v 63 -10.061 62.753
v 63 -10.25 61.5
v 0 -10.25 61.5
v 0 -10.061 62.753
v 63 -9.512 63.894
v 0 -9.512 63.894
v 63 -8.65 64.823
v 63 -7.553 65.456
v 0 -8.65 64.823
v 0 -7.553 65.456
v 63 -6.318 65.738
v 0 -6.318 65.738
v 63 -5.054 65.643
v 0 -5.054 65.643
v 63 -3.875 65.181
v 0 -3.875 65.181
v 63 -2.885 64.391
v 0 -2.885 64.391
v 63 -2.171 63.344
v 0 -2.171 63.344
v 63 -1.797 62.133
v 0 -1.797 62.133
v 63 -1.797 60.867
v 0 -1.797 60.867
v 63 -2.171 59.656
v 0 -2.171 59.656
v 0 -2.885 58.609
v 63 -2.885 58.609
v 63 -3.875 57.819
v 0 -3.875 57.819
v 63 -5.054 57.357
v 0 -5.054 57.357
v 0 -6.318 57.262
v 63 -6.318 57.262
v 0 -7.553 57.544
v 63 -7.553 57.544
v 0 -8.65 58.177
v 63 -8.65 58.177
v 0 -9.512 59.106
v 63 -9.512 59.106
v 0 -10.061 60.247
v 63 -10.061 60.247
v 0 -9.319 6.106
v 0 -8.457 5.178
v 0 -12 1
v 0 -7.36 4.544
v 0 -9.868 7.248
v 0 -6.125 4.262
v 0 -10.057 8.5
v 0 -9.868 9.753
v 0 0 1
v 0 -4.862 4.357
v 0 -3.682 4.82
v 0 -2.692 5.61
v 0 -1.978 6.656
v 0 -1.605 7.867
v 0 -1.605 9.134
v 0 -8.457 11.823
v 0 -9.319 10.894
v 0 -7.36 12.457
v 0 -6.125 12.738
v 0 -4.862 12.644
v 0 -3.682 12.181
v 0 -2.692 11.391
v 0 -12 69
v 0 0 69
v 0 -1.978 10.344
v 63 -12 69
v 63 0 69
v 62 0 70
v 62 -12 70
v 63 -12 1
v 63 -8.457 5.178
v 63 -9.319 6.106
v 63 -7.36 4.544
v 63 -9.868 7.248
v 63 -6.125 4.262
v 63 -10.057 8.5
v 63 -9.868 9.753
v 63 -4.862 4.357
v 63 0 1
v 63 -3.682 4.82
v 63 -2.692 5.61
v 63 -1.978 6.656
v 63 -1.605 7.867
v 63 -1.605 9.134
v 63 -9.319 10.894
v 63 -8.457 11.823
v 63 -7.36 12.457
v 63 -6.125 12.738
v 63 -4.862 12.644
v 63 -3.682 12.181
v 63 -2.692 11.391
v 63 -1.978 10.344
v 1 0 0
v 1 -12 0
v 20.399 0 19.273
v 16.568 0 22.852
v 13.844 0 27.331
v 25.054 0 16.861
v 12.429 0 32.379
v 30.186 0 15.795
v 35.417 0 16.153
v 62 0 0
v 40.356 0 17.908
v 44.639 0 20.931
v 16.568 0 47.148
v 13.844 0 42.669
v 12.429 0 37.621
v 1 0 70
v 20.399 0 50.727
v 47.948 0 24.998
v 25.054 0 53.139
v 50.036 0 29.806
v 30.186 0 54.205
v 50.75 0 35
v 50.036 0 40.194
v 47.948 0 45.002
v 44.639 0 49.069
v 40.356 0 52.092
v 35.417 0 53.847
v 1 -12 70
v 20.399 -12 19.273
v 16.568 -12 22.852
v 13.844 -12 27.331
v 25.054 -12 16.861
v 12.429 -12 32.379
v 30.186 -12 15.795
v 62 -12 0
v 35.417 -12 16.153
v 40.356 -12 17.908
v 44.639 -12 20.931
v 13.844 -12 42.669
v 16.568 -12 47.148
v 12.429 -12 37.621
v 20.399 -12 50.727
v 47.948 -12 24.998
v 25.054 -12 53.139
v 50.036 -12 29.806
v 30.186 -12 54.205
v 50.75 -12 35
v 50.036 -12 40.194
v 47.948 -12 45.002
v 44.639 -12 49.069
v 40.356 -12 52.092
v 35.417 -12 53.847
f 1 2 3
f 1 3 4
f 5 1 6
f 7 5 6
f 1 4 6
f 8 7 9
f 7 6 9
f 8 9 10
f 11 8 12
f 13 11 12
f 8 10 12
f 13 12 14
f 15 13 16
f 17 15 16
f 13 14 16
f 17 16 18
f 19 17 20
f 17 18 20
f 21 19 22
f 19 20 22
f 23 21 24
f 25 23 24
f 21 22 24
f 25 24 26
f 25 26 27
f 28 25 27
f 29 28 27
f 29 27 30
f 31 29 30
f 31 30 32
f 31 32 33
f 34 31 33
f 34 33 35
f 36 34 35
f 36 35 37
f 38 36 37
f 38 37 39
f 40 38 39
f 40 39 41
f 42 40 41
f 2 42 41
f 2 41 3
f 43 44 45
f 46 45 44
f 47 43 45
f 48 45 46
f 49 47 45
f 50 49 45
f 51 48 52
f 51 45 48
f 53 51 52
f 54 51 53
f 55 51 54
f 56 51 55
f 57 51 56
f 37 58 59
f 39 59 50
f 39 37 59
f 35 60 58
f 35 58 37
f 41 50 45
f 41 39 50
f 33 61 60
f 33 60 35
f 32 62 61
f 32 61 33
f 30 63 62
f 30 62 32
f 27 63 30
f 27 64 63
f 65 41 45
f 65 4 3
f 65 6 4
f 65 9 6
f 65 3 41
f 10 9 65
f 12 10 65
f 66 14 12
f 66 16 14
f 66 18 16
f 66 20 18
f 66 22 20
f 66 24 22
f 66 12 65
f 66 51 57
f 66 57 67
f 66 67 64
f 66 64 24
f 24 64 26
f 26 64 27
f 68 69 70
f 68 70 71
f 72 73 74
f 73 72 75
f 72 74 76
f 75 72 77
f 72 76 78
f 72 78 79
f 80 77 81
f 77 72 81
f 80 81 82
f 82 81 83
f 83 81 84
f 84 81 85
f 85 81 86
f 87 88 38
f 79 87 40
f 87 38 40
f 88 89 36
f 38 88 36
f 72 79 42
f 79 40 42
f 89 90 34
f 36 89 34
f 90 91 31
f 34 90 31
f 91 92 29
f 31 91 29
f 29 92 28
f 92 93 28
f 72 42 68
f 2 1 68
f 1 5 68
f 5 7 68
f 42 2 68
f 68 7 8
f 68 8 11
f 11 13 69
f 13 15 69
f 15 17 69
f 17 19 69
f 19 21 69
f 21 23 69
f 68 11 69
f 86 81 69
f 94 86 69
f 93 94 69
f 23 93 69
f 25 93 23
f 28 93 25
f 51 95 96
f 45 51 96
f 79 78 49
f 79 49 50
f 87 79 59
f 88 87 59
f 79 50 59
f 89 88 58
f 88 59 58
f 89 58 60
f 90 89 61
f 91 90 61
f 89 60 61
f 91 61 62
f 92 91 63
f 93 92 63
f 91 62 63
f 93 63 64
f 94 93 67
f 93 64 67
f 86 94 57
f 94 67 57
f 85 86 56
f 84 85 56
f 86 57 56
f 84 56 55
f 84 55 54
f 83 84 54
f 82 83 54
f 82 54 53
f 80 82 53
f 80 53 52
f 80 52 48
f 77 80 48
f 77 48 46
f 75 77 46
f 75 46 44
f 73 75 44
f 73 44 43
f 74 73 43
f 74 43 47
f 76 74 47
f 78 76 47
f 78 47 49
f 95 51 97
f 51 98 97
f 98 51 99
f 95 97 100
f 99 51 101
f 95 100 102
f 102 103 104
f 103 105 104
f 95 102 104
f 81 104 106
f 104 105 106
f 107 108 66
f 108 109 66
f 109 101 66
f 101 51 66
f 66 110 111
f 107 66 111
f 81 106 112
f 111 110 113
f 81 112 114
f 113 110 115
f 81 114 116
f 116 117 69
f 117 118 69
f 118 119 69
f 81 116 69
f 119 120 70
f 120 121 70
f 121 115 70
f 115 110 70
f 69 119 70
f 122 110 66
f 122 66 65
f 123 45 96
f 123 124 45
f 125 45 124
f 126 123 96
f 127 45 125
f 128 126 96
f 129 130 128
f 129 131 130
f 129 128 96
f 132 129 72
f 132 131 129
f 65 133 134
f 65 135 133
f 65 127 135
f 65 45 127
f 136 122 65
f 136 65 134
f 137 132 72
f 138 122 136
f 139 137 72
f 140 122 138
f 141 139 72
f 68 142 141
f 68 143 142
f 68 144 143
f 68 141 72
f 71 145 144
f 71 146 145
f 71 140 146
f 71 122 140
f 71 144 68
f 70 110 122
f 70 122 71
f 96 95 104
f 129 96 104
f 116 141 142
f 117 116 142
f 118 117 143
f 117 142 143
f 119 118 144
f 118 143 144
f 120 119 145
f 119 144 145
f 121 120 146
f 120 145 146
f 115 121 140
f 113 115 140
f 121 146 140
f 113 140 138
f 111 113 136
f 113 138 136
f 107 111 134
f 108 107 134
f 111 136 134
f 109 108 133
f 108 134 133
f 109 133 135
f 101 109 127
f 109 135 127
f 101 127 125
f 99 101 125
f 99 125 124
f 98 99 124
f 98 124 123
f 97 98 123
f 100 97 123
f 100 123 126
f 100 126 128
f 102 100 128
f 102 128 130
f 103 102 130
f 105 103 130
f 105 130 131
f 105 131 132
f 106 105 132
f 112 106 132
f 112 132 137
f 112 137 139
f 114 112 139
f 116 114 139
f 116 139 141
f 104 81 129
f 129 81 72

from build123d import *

# Parameters (mm, degrees)
F0_W     = 63
F0_H     = 70
F1_DEPTH = 12
F2_R     = 19.25
F3_DEPTH = 25
F4_R     = 4.25
F5_DEPTH = 63.001
F6_SIZE  = 1


with BuildPart() as f1:
    # F0 (on Front) → F1 (new body)
    with BuildSketch(Plane.XZ):
        with Locations((31.5, 35)):
            Rectangle(F0_W, F0_H)
    extrude(amount=F1_DEPTH)

    # F2 (on face) → F3 (cut)
    with BuildSketch(Plane.XZ.offset(12)):
        with Locations((31.5, 35)):
            Circle(F2_R)
    extrude(amount=-F3_DEPTH, mode=Mode.SUBTRACT)

    # F4 (on face) → F5 (cut, through all)
    with BuildSketch(Plane(origin=(0, 0, 0), x_dir=(0, -1, 0), z_dir=(-1, 0, 0))):
        with Locations((6, 61.5)):
            Circle(F4_R)
        with Locations((5.807274, 8.50035)):
            Circle(F4_R)
    extrude(amount=-F5_DEPTH, mode=Mode.SUBTRACT)

    # F6
    f6_edges = [f1.edges().sort_by_distance(p)[0] for p in [
        (63, -6, 70),
        (63, -6, 0),
        (0, -6, 0),
        (0, -6, 70),
    ]]
    chamfer(f6_edges, length=F6_SIZE)


solid = f1.part
